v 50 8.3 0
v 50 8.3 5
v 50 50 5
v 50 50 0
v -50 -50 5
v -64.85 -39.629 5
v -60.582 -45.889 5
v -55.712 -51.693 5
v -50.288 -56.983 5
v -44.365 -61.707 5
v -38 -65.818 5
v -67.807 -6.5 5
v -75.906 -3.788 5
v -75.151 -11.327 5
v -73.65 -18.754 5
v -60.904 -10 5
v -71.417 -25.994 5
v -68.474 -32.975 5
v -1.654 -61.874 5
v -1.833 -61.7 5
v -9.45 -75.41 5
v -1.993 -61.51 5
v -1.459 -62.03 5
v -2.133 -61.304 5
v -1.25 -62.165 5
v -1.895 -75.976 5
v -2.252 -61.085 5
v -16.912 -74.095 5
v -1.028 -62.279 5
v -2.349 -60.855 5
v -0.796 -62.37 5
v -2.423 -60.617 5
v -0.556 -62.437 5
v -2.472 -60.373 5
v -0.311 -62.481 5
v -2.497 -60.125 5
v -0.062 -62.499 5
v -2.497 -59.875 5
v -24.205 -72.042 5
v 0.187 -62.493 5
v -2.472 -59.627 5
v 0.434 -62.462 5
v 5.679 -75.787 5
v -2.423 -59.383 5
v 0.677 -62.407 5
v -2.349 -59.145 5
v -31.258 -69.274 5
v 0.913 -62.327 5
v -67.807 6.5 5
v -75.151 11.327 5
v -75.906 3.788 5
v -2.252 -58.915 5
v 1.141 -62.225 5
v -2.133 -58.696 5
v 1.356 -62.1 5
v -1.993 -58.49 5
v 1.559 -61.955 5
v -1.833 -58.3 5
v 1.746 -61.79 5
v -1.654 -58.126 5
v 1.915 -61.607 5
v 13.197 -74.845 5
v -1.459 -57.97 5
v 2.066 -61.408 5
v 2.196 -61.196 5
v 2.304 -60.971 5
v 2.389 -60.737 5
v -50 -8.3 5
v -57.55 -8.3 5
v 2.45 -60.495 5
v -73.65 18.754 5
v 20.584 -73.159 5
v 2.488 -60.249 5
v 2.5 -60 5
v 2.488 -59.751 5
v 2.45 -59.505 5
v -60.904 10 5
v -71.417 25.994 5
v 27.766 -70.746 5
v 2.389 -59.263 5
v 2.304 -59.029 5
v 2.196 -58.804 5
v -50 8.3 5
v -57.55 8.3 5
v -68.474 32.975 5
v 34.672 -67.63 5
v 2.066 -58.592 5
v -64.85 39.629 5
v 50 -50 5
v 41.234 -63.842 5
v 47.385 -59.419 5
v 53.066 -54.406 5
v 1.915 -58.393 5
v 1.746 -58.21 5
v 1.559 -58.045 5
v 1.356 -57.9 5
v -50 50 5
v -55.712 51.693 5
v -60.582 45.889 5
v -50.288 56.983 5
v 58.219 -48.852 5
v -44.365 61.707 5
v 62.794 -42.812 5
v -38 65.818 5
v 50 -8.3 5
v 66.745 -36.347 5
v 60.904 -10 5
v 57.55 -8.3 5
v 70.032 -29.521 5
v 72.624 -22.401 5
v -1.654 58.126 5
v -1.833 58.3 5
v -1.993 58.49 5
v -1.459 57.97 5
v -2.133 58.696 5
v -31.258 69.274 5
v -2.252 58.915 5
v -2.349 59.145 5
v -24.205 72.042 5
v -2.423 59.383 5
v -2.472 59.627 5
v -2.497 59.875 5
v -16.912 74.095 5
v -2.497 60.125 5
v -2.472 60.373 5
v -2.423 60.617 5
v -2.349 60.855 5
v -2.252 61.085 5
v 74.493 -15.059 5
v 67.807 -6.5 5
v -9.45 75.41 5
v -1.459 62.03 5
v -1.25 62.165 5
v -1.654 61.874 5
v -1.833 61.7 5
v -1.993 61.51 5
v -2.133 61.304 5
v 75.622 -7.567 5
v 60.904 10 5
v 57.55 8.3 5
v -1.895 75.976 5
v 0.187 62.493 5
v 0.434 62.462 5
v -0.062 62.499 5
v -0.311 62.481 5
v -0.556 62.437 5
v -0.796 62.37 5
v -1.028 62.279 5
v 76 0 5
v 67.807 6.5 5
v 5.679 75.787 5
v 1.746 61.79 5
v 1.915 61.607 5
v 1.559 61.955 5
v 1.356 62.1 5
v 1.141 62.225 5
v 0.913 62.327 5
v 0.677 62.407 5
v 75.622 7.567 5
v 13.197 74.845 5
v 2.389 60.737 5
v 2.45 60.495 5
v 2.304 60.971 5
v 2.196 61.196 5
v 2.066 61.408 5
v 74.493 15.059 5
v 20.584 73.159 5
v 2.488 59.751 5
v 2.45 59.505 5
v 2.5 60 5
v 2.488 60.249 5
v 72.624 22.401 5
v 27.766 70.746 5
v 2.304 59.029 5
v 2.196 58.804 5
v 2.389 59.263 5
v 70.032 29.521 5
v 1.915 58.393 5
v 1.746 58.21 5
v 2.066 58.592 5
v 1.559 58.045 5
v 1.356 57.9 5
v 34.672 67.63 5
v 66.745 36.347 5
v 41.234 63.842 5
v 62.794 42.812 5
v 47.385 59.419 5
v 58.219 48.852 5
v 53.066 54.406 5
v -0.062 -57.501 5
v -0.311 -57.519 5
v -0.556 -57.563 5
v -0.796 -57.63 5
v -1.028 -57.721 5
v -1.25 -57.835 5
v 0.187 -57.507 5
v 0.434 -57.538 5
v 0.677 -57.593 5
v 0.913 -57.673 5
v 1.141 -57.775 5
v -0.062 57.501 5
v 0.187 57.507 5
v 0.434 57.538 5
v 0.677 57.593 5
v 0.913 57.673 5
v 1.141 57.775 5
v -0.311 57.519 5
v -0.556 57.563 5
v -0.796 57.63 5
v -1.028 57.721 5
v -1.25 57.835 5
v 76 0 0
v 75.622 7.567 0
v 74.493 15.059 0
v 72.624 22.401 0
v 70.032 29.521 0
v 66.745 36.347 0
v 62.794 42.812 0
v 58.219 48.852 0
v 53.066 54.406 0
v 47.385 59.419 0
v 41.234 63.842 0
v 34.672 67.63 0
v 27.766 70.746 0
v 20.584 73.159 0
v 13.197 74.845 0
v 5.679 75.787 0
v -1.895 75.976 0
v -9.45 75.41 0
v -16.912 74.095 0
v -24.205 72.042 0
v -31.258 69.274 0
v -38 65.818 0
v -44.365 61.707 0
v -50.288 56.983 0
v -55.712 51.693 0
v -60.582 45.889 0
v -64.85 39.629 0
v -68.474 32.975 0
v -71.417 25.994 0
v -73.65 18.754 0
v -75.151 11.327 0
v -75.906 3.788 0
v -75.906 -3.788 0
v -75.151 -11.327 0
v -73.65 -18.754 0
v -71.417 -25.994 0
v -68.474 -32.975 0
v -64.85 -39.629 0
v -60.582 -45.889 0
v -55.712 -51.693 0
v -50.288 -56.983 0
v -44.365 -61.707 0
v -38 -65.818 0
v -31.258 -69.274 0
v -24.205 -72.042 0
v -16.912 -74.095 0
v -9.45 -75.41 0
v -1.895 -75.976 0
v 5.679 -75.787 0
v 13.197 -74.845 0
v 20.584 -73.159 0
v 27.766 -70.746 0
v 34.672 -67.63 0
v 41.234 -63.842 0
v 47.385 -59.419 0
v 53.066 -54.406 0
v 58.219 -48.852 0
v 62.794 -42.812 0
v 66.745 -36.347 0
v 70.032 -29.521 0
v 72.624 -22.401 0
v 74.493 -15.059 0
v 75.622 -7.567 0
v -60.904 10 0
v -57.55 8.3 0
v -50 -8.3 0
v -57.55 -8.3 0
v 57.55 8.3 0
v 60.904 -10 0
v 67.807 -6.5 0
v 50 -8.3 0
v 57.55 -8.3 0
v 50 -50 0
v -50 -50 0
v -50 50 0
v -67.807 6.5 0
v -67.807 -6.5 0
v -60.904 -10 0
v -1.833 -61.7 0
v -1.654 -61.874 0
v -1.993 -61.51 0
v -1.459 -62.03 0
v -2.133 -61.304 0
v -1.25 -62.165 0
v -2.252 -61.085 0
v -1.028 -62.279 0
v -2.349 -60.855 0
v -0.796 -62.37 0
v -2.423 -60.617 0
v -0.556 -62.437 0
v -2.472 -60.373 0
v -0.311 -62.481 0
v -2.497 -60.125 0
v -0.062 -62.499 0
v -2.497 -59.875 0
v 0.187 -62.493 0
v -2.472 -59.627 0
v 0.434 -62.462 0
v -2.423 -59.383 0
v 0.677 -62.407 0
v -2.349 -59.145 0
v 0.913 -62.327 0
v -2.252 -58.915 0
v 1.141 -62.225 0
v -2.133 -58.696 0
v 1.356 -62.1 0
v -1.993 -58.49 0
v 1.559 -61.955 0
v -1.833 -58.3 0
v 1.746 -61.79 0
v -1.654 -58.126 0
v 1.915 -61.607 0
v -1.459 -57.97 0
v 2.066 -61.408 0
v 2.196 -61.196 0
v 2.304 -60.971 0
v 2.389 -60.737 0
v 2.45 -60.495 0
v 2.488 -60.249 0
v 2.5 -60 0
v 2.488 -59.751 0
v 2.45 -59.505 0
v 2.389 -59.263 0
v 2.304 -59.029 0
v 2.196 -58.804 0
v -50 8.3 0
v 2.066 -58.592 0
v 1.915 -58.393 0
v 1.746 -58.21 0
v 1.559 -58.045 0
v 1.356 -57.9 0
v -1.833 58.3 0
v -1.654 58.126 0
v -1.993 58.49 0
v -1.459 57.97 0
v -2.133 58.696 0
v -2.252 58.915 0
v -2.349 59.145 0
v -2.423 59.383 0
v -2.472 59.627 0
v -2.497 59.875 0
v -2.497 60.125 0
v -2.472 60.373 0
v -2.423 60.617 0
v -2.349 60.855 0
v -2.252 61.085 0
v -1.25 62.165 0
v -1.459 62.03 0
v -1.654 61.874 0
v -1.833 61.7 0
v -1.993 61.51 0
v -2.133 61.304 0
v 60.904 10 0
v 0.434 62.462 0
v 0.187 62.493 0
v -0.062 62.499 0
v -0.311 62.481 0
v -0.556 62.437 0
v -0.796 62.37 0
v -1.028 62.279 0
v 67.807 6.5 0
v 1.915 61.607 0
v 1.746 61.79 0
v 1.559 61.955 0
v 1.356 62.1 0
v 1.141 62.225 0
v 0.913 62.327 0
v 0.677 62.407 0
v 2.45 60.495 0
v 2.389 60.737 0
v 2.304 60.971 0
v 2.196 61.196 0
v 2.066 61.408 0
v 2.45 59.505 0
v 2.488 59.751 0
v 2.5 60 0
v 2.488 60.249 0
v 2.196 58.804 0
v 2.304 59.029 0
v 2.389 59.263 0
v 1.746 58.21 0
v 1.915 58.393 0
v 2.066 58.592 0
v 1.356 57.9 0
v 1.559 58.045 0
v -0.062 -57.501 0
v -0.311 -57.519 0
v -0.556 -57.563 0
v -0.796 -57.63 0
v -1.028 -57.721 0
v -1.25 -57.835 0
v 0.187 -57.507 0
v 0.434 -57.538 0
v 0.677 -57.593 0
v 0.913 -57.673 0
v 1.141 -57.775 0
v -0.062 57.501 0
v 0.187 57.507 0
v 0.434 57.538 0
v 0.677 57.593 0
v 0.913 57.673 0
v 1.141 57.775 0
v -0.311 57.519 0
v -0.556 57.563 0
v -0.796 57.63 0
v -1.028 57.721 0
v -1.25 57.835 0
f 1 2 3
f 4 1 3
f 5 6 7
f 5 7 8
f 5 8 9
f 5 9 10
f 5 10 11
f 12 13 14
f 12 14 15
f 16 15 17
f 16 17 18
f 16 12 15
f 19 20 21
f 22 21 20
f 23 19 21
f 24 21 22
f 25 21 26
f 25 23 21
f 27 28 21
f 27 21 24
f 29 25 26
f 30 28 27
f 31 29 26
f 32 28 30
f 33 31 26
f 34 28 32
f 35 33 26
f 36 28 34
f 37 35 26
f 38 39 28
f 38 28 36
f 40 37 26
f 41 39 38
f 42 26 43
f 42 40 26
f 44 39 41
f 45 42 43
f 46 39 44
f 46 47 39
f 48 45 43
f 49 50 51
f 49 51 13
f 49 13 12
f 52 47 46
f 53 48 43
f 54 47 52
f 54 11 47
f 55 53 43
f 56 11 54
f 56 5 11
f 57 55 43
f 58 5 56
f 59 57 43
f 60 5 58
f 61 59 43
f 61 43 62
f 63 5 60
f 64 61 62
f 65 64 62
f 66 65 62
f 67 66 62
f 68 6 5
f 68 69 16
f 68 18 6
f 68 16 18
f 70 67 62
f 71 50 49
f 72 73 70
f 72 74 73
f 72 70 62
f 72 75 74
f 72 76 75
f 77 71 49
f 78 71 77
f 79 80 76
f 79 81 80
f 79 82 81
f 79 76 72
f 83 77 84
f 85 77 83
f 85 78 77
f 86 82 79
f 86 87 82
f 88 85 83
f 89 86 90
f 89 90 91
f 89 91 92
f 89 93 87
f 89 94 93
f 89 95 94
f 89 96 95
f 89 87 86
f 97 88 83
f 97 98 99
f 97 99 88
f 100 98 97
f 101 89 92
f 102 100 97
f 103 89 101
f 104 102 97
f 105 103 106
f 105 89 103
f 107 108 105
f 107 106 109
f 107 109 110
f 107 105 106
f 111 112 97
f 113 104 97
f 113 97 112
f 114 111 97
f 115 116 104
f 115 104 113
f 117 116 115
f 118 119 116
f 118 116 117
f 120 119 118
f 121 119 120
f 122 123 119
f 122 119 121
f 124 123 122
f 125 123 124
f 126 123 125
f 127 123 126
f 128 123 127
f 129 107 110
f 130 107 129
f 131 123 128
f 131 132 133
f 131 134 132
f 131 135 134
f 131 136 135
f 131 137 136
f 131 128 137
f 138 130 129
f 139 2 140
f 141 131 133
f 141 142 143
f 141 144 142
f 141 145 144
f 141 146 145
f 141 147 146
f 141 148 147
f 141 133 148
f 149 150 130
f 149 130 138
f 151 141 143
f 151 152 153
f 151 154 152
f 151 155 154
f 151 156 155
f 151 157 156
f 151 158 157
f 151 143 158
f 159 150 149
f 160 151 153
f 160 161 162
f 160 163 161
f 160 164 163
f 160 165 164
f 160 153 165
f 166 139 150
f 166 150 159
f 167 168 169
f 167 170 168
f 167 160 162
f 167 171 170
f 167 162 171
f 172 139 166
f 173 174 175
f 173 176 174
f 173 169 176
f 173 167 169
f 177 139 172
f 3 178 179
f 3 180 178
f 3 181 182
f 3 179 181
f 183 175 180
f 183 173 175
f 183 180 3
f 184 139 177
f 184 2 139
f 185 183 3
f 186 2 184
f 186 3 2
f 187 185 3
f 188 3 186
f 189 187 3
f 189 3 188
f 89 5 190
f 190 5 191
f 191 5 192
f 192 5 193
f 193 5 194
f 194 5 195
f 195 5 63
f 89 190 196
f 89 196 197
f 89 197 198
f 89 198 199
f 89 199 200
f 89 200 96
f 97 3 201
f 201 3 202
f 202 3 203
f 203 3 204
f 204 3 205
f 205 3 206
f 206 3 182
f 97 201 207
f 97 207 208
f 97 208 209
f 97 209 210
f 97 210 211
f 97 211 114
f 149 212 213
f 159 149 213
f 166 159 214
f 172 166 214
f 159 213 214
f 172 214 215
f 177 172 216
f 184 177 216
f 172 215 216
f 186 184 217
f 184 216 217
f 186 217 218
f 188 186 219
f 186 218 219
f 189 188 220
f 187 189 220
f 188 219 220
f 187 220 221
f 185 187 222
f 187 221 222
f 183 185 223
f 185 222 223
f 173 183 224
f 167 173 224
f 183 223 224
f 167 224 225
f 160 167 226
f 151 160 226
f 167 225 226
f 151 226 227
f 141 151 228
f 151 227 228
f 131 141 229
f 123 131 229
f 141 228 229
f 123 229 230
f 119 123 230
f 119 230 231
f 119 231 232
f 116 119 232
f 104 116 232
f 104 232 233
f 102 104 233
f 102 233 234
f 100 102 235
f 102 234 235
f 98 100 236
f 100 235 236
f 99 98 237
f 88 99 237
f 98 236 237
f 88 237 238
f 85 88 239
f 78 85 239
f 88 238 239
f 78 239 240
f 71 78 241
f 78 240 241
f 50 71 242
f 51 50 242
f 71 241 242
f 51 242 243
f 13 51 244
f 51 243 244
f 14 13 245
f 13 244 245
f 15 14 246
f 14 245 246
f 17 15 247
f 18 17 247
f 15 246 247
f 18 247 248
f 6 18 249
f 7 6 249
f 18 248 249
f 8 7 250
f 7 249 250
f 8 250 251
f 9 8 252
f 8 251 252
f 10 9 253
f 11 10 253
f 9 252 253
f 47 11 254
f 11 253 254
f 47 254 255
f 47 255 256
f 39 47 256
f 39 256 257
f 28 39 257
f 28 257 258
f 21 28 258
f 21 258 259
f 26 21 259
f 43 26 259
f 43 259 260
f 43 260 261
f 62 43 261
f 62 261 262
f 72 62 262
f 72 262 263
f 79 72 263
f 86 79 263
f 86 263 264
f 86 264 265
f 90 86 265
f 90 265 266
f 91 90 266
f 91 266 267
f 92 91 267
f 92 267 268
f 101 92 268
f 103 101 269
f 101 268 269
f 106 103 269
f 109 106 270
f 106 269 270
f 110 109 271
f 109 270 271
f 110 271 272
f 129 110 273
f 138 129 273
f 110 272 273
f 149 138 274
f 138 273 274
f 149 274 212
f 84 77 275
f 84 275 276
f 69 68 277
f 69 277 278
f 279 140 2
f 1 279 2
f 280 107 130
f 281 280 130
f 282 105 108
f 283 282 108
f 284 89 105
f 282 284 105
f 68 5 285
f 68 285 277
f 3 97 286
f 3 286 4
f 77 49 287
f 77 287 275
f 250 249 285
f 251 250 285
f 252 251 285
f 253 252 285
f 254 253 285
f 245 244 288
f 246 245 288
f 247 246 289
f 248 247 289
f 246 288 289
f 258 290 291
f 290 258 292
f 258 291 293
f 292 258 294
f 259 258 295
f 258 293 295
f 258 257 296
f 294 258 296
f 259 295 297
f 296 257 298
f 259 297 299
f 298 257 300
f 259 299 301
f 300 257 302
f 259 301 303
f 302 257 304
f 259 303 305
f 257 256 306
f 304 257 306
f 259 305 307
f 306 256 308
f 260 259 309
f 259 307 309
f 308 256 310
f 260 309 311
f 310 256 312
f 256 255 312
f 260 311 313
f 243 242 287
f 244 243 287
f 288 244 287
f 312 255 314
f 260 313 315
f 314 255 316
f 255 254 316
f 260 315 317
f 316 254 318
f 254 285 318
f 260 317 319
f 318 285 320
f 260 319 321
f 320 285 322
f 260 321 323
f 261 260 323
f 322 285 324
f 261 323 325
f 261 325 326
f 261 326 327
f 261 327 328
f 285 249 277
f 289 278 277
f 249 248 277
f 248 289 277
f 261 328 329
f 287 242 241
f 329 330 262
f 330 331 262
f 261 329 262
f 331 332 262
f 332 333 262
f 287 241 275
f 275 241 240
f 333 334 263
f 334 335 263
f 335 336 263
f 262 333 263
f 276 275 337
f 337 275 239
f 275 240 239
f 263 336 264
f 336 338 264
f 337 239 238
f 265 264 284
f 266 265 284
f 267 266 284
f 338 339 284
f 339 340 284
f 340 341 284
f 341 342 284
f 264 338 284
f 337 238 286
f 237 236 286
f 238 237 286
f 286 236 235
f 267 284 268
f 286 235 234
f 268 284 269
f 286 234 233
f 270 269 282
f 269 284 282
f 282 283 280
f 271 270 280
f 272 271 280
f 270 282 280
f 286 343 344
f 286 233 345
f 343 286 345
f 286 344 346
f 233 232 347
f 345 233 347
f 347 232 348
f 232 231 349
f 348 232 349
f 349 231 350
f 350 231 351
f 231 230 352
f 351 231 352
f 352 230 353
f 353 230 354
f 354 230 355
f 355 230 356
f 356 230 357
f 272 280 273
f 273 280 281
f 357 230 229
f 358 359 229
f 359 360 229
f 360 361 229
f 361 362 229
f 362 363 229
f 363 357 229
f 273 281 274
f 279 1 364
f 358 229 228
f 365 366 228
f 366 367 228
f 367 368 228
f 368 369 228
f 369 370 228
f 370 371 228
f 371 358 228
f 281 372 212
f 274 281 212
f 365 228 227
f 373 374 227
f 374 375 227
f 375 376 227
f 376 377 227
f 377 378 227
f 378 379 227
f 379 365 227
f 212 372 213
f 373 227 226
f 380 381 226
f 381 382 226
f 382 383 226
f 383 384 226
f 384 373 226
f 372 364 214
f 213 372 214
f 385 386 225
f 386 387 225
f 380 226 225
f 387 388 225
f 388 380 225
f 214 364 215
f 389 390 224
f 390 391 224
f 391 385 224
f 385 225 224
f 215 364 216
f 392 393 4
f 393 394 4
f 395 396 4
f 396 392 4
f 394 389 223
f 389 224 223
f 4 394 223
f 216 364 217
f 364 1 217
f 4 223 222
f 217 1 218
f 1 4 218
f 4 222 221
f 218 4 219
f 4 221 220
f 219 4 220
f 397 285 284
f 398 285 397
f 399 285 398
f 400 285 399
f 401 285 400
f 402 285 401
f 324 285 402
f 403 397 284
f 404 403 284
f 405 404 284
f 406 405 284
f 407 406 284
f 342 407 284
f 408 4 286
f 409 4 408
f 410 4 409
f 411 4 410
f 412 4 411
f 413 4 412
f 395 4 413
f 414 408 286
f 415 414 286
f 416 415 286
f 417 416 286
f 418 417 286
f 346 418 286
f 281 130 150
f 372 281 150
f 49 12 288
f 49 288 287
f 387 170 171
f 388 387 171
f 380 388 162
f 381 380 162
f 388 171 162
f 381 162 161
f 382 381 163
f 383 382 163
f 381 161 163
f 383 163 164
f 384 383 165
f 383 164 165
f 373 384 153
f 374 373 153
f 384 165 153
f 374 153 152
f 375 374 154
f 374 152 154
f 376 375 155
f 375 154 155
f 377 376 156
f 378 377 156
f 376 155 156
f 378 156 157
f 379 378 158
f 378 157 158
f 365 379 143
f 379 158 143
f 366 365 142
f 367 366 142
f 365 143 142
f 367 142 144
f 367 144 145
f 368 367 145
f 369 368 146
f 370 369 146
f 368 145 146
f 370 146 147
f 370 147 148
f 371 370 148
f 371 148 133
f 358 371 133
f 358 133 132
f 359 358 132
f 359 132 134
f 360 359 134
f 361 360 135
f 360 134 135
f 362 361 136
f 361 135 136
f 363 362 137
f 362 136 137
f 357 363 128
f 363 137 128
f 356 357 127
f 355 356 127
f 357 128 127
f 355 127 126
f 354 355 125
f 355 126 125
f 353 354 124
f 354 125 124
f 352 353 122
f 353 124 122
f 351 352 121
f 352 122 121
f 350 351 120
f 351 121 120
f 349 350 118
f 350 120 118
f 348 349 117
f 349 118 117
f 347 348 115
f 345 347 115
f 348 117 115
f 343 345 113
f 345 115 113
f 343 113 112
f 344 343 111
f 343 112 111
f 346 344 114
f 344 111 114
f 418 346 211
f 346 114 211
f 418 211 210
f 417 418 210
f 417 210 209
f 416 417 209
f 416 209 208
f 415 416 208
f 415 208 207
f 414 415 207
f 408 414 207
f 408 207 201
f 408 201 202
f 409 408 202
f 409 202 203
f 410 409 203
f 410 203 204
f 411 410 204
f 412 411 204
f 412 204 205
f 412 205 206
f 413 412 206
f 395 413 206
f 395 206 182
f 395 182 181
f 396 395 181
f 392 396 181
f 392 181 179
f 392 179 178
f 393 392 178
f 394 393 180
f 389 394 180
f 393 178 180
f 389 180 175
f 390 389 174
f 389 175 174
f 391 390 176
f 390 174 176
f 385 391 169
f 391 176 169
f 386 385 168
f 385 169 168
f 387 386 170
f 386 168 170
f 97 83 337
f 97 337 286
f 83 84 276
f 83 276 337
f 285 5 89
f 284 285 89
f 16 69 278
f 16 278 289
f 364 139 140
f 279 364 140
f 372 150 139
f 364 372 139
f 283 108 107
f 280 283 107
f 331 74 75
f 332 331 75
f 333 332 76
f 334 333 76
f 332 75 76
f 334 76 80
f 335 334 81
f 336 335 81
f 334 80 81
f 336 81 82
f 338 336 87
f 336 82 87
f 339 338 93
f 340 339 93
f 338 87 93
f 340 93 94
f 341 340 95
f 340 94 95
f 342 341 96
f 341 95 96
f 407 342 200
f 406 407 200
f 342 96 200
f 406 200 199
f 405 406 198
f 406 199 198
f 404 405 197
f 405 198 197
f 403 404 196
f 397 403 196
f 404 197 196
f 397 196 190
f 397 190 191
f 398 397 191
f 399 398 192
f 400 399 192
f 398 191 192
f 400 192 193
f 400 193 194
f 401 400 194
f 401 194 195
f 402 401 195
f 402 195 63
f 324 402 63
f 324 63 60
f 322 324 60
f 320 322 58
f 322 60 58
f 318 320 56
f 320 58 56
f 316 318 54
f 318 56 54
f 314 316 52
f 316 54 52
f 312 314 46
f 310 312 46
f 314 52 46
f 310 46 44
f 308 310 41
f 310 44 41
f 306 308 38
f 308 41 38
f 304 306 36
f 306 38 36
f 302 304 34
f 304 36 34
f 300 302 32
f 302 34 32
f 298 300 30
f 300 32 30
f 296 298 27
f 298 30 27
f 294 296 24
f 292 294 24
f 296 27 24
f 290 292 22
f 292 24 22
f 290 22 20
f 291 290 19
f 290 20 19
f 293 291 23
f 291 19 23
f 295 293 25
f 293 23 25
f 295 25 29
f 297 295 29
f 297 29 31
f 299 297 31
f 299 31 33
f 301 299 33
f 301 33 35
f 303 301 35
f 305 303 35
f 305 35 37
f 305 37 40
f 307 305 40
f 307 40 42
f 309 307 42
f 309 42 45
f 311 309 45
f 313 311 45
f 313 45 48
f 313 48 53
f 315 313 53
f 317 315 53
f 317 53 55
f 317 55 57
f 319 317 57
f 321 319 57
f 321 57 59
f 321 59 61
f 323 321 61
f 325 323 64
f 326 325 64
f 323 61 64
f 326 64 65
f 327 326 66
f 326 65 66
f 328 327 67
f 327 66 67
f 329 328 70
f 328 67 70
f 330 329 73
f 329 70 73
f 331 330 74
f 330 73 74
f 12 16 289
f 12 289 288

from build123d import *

# Parameters (mm, degrees)
SKETCH1_R          = 76
CIRCLE_DEPTH       = 5
SKETCH2_W          = 100
SKETCH2_H          = 100
SQUARE_DEPTH       = 5
SKETCH3_R          = 2.5
HOLES_DEPTH        = 5
CUT_EXTRUDE3_DEPTH = 5


with BuildPart() as part:
    # Sketch1 → circle (new body)
    with BuildSketch(Plane.XY):
        Circle(SKETCH1_R)
    extrude(amount=CIRCLE_DEPTH)

    # Sketch2 → square (cut)
    with BuildSketch(Plane.XY.offset(5)):
        Rectangle(SKETCH2_W, SKETCH2_H)
    extrude(amount=-SQUARE_DEPTH, mode=Mode.SUBTRACT)

    # Sketch3 → holes (cut)
    with BuildSketch(Plane.XY.offset(5)):
        with Locations((0, 60)):
            Circle(SKETCH3_R)
        with Locations((0, -60)):
            Circle(SKETCH3_R)
    extrude(amount=-HOLES_DEPTH, mode=Mode.SUBTRACT)

    # Sketch4 → Cut-Extrude3 (cut)
    with BuildSketch(Plane.XY.offset(5)):
        Polygon((-50, 0), (-50, -8.3), (-57.55, -8.3), (-60.903744176, -10), (-67.80719259, -6.5), (-67.80719259, 6.5), (-60.903744176, 10), (-57.55, 8.3), (-50, 8.3), align=None)
        Polygon((57.55, 8.3), (50, 8.3), (50, 0), (50, -8.3), (57.55, -8.3), (60.903744176, -10), (67.80719259, -6.5), (67.80719259, 6.5), (60.903744176, 10), align=None)
    extrude(amount=-CUT_EXTRUDE3_DEPTH, mode=Mode.SUBTRACT)


solid = part.part
